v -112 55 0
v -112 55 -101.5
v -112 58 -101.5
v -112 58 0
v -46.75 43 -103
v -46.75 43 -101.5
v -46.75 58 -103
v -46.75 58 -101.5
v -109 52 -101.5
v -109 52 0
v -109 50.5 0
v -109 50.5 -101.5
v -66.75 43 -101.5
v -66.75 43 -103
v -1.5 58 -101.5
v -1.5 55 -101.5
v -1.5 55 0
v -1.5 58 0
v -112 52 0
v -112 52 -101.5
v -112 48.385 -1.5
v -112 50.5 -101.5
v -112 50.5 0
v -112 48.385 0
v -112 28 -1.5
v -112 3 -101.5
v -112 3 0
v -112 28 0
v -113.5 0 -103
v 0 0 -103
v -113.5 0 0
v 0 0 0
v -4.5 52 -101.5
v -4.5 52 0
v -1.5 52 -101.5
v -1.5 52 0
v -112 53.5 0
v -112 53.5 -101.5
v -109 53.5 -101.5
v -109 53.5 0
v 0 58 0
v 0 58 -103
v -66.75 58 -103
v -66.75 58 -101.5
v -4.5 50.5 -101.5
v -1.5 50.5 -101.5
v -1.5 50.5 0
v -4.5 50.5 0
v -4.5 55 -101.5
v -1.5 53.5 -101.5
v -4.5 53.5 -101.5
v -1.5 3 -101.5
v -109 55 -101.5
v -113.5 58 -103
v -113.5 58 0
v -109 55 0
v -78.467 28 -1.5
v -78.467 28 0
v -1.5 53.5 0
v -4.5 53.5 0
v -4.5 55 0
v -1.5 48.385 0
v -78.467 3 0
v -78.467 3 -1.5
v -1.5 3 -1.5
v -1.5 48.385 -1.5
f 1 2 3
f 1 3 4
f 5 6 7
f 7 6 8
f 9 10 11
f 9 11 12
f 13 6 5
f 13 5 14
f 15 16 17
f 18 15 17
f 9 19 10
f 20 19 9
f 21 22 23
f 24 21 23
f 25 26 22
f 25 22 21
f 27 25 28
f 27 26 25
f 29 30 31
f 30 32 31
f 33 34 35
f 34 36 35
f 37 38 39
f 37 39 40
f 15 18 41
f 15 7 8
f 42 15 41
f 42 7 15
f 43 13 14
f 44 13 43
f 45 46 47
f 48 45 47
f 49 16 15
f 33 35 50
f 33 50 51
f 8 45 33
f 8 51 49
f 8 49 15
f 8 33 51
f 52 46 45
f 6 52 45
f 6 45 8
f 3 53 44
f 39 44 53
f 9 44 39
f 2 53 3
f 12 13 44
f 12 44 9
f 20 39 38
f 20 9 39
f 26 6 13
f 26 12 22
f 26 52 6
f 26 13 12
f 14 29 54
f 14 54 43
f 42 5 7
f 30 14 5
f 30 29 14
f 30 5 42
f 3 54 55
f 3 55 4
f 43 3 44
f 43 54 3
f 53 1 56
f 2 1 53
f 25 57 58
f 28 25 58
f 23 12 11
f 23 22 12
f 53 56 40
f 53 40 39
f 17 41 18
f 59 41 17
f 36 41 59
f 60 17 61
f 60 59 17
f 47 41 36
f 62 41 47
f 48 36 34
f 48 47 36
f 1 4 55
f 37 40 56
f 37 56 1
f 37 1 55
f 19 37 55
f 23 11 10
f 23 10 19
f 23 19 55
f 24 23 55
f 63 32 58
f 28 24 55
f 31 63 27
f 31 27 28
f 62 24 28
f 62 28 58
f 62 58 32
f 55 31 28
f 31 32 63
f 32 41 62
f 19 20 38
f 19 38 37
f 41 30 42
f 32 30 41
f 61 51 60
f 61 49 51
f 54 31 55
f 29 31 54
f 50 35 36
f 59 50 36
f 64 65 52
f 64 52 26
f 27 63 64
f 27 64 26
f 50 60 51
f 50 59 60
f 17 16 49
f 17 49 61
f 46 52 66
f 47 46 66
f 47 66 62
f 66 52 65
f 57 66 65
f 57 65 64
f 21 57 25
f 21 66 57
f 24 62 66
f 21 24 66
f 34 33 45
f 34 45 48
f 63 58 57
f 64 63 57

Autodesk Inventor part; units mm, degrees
ref_plane "YZ Plane" through (0, 0, 0) normal (1, 0, 0) x (0, 1, 0)
ref_plane "XZ Plane" through (0, 0, 0) normal (0, 1, 0) x (-1, 0, 0)
ref_plane "XY Plane" through (0, 0, 0) normal (0, 0, 1) x (1, 0, 0)
sketch "Sketch1" plane through (0, 0, 0) normal (0, 1, 0) x (-1, 0, 0)
  line L0 (0, 0) -> (113.5, 0)
  line L1 (113.5, 0) -> (113.5, -103)
  line L2 (113.5, -103) -> (0, -103)
  line L3 (0, -103) -> (0, 0)
  dimension "d0" = 113.5
  dimension "d1" = 103
extrude "Extrusion1" add sketch "Sketch1" along normal blind 3
sketch "Sketch2" plane through (0, 3, 0) normal (0, 1, 0) x (1, 0, 0)
  line L0 (0, 0) -> (0, 103) projected
  line L1 (-113.5, 0) -> (0, 0) projected
  line L2 (0, 103) -> (-113.5, 103) projected
  line L3 (-113.5, 103) -> (-113.5, 0) projected
  line L4 (-112, 51.5) -> (-112, 0)
  line L5 (-56.75, 101.5) -> (-112, 101.5)
  line L6 (-112, 101.5) -> (-1.5, 101.5)
  line L7 (-1.5, 101.5) -> (-1.5, 0)
  line L8 (-112, 0) -> (-112, 101.5)
extrude "Extrusion2" add sketch "Sketch2" along normal blind 55 contours L1 L7 L6 L5 L8 L4 L3 L2 L0
sketch "Sketch3" plane through (-112, 3, -101.5) normal (0, 0, 1) x (1, 0, 0)
  point P0 (112, -3)
sketch "Sketch4" plane through (-112, 3, -101.5) normal (0, 0, 1) x (1, 0, 0)
  line L0 (0, 55) -> (110.5, 55) projected
  line L1 (65.25, 40) -> (45.25, 40)
  line L2 (45.25, 40) -> (45.25, 55)
  line L3 (65.25, 40) -> (65.25, 55)
  line L4 (45.25, 55) -> (65.25, 55)
  point P0 (112, -3)
  dimension "d11" = 20
extrude "Extrusion3" cut sketch "Sketch4" against normal through all
sketch "Sketch5" plane through (-112, 3, 0) normal (1, 0, 0) x (0, 0, -1)
  line L0 (0, 55) -> (101.5, 55) projected
  line L1 (0, 0) -> (0, 55) projected
  line L2 (0, 52.0001) -> (101.5, 52.0001)
  line L3 (101.5, 0) -> (101.5, 55) projected
  line L4 (101.5, 52.0001) -> (101.5, 50.5001)
  line L5 (101.5, 50.5001) -> (0, 50.5001)
  line L6 (0, 52.0001) -> (0, 50.5001)
  line L7 (0, 49.0001) -> (101.5, 49.0001)
  line L8 (101.5, 49.0001) -> (101.5, 47.5001)
  line L9 (101.5, 47.5001) -> (0, 47.5001)
  line L10 (0, -3) -> (0, 55) projected
  line L11 (0, 49.0001) -> (0, 47.5001)
  dimension "d14" = 1.5
  dimension "d15" = 1.5
  dimension "d16" = 1.5
extrude "Extrusion4" add sketch "Sketch5" along normal blind 3 contours L2 L3 L5 L1 | L7 L3 L9 L1
sketch "Sketch6" plane through (-1.5, 3, -101.5) normal (-1, 0, 0) x (0, 0, 1)
  line L0 (0, 55) -> (101.5, 55) projected
  line L1 (0, 0) -> (0, 55) projected
  line L2 (0, 52) -> (101.5, 52)
  line L3 (101.5, 0) -> (101.5, 55) projected
  line L4 (101.5, 52) -> (101.5, 50.5)
  line L5 (101.5, 50.5) -> (0, 50.5)
  line L6 (0, 50.5) -> (0, 52)
  line L7 (101.5, 49) -> (0, 49)
  line L8 (0, 49) -> (0, 47.5)
  line L9 (0, 47.5) -> (101.5, 47.5)
  line L10 (101.5, -3) -> (101.5, 55) projected
  line L11 (101.5, 49) -> (101.5, 47.5)
  dimension "d20" = 1.5
  dimension "d21" = 1.5
  dimension "d22" = 1.5
extrude "Extrusion5" add sketch "Sketch6" along normal blind 3 contours L2 L3 L5 L1 | L7 L3 L9 L1
sketch "Sketch8" plane through (-1.5, 3, -101.5) normal (-1, 0, 0) x (0, 0, 1)
  line L0 (101.5, 0) -> (101.5, 47.5) projected
  line L1 (101.5, 45.3848) -> (101.5, 43.8848)
  line L2 (101.5, 45.3848) -> (100, 45.3848)
  line L3 (100, 45.3848) -> (100, 24.9998)
  line L4 (100, 24.9998) -> (101.5, 24.9998)
  line L5 (101.5, -3) -> (101.5, 55) projected
  dimension "d27" = 1.5
  dimension "d28" = 1.5
  dimension "d29" = 20.385
extrude "Extrusion6" add sketch "Sketch8" along normal up to surface (110.5 mm away)
sketch "Sketch10" plane through (-112, 27.9998, -1.5) normal (0, -1, 0) x (1, 0, 0)
  line L0 (110.5, 1.5) -> (0, 1.5) projected
  line L1 (33.533, 1.5) -> (33.533, 0)
  line L2 (110.5, 0) -> (0, 0) projected
  line L3 (33.4948, 1.5) -> (110.5, 1.5)
  line L4 (110.5, 1.5) -> (110.5, 0) projected
  line L5 (110.5, 1.5) -> (110.5, 0)
  line L6 (110.5, 0) -> (33.533, 0)
  point P0 (112, 1.5)
extrude "Extrusion7" add sketch "Sketch10" along normal up to surface (24.9998 mm away)
properties part number "casingN"
